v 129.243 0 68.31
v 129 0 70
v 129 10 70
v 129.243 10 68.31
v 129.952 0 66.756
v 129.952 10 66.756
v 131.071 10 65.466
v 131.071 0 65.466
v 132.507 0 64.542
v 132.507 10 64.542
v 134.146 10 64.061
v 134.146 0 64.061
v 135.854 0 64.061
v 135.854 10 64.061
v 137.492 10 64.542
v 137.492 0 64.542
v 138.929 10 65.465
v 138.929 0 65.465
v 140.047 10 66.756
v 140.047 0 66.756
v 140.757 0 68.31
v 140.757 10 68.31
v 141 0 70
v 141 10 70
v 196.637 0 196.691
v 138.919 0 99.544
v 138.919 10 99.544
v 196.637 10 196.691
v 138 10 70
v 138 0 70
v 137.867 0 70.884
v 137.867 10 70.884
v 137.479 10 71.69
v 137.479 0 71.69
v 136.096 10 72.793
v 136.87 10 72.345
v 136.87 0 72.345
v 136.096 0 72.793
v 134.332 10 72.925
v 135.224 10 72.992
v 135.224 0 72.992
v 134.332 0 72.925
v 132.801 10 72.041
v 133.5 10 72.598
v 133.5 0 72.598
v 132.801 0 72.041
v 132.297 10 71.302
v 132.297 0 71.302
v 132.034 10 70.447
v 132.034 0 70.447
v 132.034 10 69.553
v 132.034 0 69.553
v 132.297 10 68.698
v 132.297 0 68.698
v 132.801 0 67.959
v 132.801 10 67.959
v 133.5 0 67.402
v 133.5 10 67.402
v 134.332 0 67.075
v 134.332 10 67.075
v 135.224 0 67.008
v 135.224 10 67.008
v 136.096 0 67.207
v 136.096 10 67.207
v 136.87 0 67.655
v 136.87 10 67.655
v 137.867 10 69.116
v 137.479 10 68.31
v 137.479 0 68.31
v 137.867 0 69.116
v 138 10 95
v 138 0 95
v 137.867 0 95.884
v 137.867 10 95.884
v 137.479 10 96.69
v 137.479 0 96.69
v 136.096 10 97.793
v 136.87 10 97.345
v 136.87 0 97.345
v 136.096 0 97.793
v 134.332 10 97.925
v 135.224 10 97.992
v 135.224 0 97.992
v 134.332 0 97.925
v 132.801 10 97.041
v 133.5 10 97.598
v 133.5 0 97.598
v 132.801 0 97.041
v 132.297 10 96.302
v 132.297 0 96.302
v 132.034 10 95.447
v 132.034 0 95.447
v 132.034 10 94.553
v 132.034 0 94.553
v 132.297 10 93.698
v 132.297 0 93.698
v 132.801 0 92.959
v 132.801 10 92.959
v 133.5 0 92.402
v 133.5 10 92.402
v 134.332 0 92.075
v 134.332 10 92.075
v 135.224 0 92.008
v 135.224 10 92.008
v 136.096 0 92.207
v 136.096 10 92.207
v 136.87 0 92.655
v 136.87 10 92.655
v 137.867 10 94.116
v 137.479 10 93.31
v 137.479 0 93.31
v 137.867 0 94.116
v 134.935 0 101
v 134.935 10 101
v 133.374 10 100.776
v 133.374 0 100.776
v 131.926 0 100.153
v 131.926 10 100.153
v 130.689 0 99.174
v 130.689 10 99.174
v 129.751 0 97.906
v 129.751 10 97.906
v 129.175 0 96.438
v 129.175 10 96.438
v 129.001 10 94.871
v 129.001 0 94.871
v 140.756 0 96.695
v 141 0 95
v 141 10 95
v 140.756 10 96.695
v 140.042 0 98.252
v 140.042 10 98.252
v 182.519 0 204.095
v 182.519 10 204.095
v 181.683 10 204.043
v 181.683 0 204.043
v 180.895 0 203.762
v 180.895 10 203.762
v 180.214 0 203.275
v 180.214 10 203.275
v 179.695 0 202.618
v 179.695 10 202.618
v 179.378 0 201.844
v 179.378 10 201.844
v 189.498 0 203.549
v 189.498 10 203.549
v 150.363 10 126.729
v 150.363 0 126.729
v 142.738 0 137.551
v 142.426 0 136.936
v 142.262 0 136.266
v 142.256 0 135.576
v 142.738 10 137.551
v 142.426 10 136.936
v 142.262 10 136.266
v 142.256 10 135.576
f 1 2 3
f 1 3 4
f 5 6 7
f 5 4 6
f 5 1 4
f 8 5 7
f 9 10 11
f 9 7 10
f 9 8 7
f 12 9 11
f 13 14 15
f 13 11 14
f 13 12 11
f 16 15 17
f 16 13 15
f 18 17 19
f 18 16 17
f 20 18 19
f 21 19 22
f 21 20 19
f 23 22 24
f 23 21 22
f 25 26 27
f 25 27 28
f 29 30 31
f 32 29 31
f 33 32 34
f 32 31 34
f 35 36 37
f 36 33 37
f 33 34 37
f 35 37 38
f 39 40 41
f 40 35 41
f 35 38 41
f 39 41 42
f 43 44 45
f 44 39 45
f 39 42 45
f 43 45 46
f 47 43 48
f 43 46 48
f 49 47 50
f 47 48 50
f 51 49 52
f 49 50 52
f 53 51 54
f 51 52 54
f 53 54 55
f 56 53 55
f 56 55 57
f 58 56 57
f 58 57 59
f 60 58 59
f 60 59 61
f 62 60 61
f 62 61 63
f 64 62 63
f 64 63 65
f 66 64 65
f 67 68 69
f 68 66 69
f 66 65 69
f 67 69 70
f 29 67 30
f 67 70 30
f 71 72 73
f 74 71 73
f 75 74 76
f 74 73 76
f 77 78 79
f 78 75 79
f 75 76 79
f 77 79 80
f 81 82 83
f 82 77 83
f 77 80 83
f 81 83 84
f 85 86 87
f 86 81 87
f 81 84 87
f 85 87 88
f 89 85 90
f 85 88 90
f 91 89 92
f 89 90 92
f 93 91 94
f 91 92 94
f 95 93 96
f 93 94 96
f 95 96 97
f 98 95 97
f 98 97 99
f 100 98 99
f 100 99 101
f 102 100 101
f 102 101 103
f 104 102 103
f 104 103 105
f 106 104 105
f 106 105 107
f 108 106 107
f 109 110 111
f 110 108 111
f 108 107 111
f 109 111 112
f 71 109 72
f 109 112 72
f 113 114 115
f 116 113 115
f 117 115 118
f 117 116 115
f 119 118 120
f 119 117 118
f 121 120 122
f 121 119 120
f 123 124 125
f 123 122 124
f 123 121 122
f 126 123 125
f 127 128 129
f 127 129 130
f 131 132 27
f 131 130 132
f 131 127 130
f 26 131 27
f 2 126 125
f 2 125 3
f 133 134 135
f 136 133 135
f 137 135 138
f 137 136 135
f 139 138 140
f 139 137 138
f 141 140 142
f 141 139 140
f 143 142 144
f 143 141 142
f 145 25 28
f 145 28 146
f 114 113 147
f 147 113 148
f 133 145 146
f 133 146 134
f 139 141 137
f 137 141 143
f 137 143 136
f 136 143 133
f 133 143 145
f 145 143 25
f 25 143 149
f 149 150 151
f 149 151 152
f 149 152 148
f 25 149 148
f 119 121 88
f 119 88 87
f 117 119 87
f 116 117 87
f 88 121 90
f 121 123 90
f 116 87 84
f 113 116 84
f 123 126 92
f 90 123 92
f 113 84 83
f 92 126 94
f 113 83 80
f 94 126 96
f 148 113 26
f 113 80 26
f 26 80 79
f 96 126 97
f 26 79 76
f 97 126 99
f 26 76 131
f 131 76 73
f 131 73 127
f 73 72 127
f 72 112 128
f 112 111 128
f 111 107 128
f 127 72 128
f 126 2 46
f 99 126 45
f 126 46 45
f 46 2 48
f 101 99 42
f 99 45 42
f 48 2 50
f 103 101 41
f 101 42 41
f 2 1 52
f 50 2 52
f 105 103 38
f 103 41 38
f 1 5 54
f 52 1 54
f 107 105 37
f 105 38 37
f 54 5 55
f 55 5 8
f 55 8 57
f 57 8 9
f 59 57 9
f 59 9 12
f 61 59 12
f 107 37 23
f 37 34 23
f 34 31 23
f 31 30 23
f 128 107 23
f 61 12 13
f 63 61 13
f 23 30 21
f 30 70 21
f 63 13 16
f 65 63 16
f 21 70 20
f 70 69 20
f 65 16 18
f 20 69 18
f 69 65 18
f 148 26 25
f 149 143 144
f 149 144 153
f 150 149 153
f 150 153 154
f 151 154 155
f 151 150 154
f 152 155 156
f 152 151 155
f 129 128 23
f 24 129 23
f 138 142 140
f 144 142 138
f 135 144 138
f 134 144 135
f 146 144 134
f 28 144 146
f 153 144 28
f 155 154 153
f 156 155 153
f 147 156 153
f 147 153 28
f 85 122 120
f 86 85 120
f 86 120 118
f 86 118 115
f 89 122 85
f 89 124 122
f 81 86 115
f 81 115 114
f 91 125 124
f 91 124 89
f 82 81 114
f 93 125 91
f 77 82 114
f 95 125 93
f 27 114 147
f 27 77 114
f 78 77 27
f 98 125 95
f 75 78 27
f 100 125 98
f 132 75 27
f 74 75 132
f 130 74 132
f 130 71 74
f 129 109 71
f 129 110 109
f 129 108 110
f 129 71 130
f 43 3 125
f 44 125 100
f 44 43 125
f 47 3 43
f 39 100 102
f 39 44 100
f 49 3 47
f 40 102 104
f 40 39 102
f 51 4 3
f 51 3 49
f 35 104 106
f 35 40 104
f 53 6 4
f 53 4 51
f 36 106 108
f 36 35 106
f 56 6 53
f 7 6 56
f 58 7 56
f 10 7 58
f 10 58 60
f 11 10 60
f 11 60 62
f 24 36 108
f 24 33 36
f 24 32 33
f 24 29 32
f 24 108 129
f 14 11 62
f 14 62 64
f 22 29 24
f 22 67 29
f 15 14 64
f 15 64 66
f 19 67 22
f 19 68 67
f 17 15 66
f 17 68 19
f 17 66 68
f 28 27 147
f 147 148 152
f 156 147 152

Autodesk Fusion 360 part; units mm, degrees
sketch "Sketch1" plane through (0, 0, 0) normal (0, 1, 0) x (1, 0, 0)
  circle A0 centre (0.0008, 24.9355) radius 3
  line L0 (2.5556, 32.9383) -> (-2.4444, 32.9383)
  line L1 (2.5556, 20.6375) -> (2.5556, -15.7025)
  line L2 (8, 25) -> (8, -20)
  circle A1 centre (0, -20) radius 3
  line L3 (-2.6799, 20.7149) -> (-2.6799, -15.7789)
  arc A2 (2.5556, 20.6375) -> (-2.6799, 20.7149) centre (0.0008, 24.9355) ccw
  arc A3 (-2.6799, -15.7789) -> (2.5556, -15.7025) centre (0, -20) ccw
  dimension "d1" = 6
  dimension "d2" = 10
  dimension "d4" = 5
  dimension "d5" = 36.34
  dimension "d6" = 45
  dimension "d7" = 6
sketch "Sketch2" plane through (0, 0, 0) normal (0, 1, 0) x (1, 0, 0)
  circle A0 centre (160, 0) radius 3
  line L0 (165.3043, -12.1067) -> (165.3043, 17.8933)
  line L1 (165.3043, -12.1067) -> (144.0787, -27.9224)
  line L2 (144.0787, -27.9224) -> (124.0787, -27.9224)
  line L3 (124.0787, -27.9224) -> (105.4535, -9.1138)
  line L4 (105.4535, -9.1138) -> (98.3535, -9.1138)
  line L5 (98.3535, -9.1138) -> (98.3535, 10.8862)
  line L6 (98.3535, 10.8862) -> (112.5535, 10.8862)
  line L7 (112.5535, 10.8862) -> (128, 34)
  line L8 (128, 34) -> (153, 34)
  line L9 (153, 34) -> (165.3043, 17.8933)
  circle A1 centre (144.0787, -15.0238) radius 3
  circle A2 centre (124.0787, -15.0238) radius 3
  line L10 (112.4283, -2.9974) -> (127.553, -3)
  line L11 (127.2855, 2.988) -> (112.556, 3)
  arc A3 (127.553, -3) -> (127.2855, 2.988) centre (127.5535, 0) ccw
  arc A4 (112.556, 3) -> (112.6778, -2.9974) centre (112.5535, 0) ccw
  circle A5 centre (128, 28) radius 2
  circle A6 centre (153, 28) radius 2
  dimension "d10" = 6
  dimension "d11" = 30
  dimension "d12" = 26.47
  dimension "d13" = 20
  dimension "d14" = 26.47
  dimension "d15" = 7.1
  dimension "d16" = 20
  dimension "d17" = 14.2
  dimension "d18" = 27.8
  dimension "d19" = 25
  dimension "d21" = 6
  dimension "d22" = 6
  dimension "d23" = 6
  dimension "d24" = 15
  dimension "d25" = 6
  dimension "d26" = 4
  dimension "d27" = 4
sketch "Sketch3" plane through (0, 0, 0) normal (0, 1, 0) x (1, 0, 0)
sketch "Sketch4" plane through (0, 0, 0) normal (0, 1, 0) x (1, 0, 0)
sketch "Sketch5" plane through (0, 0, 0) normal (0, 1, 0) x (1, 0, 0)
  circle A0 centre (0, -75) radius 3
  circle A1 centre (-0.0243, -126.973) radius 3
  line L0 (-20, -70) -> (-20, -141.97)
  line L1 (-5, -75) -> (-5, -112.8223)
  line L2 (5, -75) -> (5, -112.8395)
  arc A2 (5, -75) -> (-5, -75) centre (0, -75) ccw
  line L3 (-0.05, -141.973) -> (-0.05, -143.513)
  line L4 (-0.05, -143.513) -> (-0.4621, -143.739)
  line L5 (-0.4621, -143.739) -> (-1.4621, -143.739)
  line L6 (-1.4621, -143.739) -> (-1.9628, -143.2357)
  line L7 (-1.9628, -143.2357) -> (-1.9628, -141.8472)
  line L8 (-0.05, -145.0973) -> (-0.05, -123.9731)
  line L9 (-8.7204, -112.6318) -> (-7.8791, -112.0912)
  line L10 (-8.9448, -113.0448) -> (-8.7204, -112.6318)
  line L11 (-8.1122, -114.3403) -> (-8.9448, -113.0448)
  line L12 (-7.1857, -112.2439) -> (-6.4351, -113.412)
  line L13 (-7.8791, -112.0912) -> (-7.1857, -112.2439)
  line L14 (-12.4085, -115.6627) -> (-11.7536, -114.907)
  line L15 (-12.5075, -116.1222) -> (-12.4085, -115.6627)
  line L16 (-11.3436, -117.1306) -> (-12.5075, -116.1222)
  line L17 (-11.0453, -114.8581) -> (-9.996, -115.7674)
  line L18 (-11.7536, -114.907) -> (-11.0453, -114.8581)
  line L19 (-15.0933, -119.6099) -> (-14.6779, -118.7003)
  line L20 (-15.0589, -120.0786) -> (-15.0933, -119.6099)
  line L21 (-13.658, -120.7184) -> (-15.0589, -120.0786)
  line L22 (-14.012, -118.4539) -> (-12.749, -119.0307)
  line L23 (-14.6779, -118.7003) -> (-14.012, -118.4539)
  line L24 (-16.5573, -124.1536) -> (-16.415, -123.1638)
  line L25 (-16.3922, -124.5936) -> (-16.5573, -124.1536)
  line L26 (-14.8679, -124.8128) -> (-16.3922, -124.5936)
  line L27 (-15.8455, -122.7398) -> (-14.4712, -122.9374)
  line L28 (-16.415, -123.1638) -> (-15.8455, -122.7398)
  line L29 (-16.682, -128.9257) -> (-16.8243, -127.9359)
  line L30 (-16.3995, -129.3014) -> (-16.682, -128.9257)
  line L31 (-14.8752, -129.0822) -> (-16.3995, -129.3014)
  line L32 (-16.3973, -127.3686) -> (-15.023, -127.171)
  line L33 (-16.8243, -127.9359) -> (-16.3973, -127.3686)
  line L34 (-15.4571, -133.5396) -> (-15.8725, -132.63)
  line L35 (-15.0802, -133.8205) -> (-15.4571, -133.5396)
  line L36 (-13.6794, -133.1808) -> (-15.0802, -133.8205)
  line L37 (-15.6226, -131.9654) -> (-14.3596, -131.3886)
  line L38 (-15.8725, -132.63) -> (-15.6226, -131.9654)
  line L39 (-12.9819, -137.6215) -> (-13.6367, -136.8658)
  line L40 (-12.5412, -137.7849) -> (-12.9819, -137.6215)
  line L41 (-11.3773, -136.7764) -> (-12.5412, -137.7849)
  line L42 (-13.5843, -136.1577) -> (-12.5349, -135.2485)
  line L43 (-13.6367, -136.8658) -> (-13.5843, -136.1577)
  line L44 (-9.457, -140.8408) -> (-10.2982, -140.3002)
  line L45 (-8.9881, -140.8734) -> (-9.457, -140.8408)
  line L46 (-8.1555, -139.5779) -> (-8.9881, -140.8734)
  line L47 (-10.4473, -139.606) -> (-9.6967, -138.4379)
  line L48 (-10.2982, -140.3002) -> (-10.4473, -139.606)
  line L49 (-5.1679, -142.9365) -> (-6.1274, -142.6548)
  line L50 (-4.7088, -142.8357) -> (-5.1679, -142.9365)
  line L51 (-4.2749, -141.3581) -> (-4.7088, -142.8357)
  line L52 (-6.466, -142.0308) -> (-6.0748, -140.6985)
  line L53 (-6.1274, -142.6548) -> (-6.466, -142.0308)
  arc A3 (-5, -112.8223) -> (-6.4351, -113.412) centre (-0.0243, -126.973) ccw
  arc A4 (-8.1122, -114.3403) -> (-9.996, -115.7674) centre (-0.0243, -126.973) ccw
  arc A5 (-11.3436, -117.1306) -> (-12.749, -119.0307) centre (-0.0243, -126.973) ccw
  arc A6 (-13.658, -120.7184) -> (-14.4712, -122.9374) centre (-0.0243, -126.973) ccw
  arc A7 (-14.8679, -124.8128) -> (-15.023, -127.171) centre (-0.0243, -126.973) ccw
  arc A8 (-14.8752, -129.0822) -> (-14.3596, -131.3886) centre (-0.0243, -126.973) ccw
  arc A9 (-13.6794, -133.1808) -> (-12.5349, -135.2485) centre (-0.0243, -126.973) ccw
  arc A10 (-11.3773, -136.7764) -> (-9.6967, -138.4379) centre (-0.0243, -126.973) ccw
  arc A11 (-8.1555, -139.5779) -> (-6.0748, -140.6985) centre (-0.0243, -126.973) ccw
  arc A12 (-4.2749, -141.3581) -> (-1.9628, -141.8472) centre (-0.0243, -126.973) ccw
  arc A13 (-0.05, -141.973) -> (5, -112.8395) centre (-0.0243, -126.973) ccw
  dimension "d30" = 6
  dimension "d31" = 10
  dimension "d32" = 6
  dimension "d33" = 30
  dimension "d34" = 71.97
  dimension "d35" = 1.54
  dimension "d36" = 0.47
  dimension "d37" = 1
  dimension "d38" = 0.71
  dimension "d40" = 360
sketch "Sketch6" plane through (0, 0, 0) normal (0, 1, 0) x (1, 0, 0)
  circle A0 centre (135, -70) radius 3
  circle A1 centre (135, -95) radius 3
  line L0 (129.0014, -94.8707) -> (129, -70.0003)
  line L1 (141, -95) -> (141, -70)
  arc A2 (141, -70) -> (129, -70.0003) centre (135, -70) ccw
  line L2 (134.9353, -100.9997) -> (150.363, -126.7288)
  line L3 (138.9186, -99.5437) -> (196.6373, -196.6907)
  arc A3 (129.0014, -94.8707) -> (134.9353, -100.9997) centre (135, -95) ccw
  arc A4 (138.9186, -99.5437) -> (141, -95) centre (135, -95) ccw
  line L4 (196.6373, -196.6907) -> (189.4976, -203.5489)
  line L5 (189.4976, -203.5489) -> (182.5189, -204.0946)
  line L6 (179.3777, -201.8435) -> (142.738, -137.5509)
  arc A5 (179.3777, -201.8435) -> (182.5189, -204.0946) centre (182.2851, -201.1037) ccw
  arc A6 (142.2555, -135.5758) -> (142.738, -137.5509) centre (145.2387, -135.8936) ccw
  line L7 (150.363, -126.7288) -> (142.2555, -135.5758)
  dimension "d43" = 6
  dimension "d44" = 12
  dimension "d45" = 25
  dimension "d46" = 6
  dimension "d47" = 12
  dimension "d48" = 30
  dimension "d50" = 113
  dimension "d52" = 9.9
  dimension "d53" = 7
  dimension "d62" = 6
  dimension "d63" = 74
  dimension "d64" = 6
  dimension "d69" = 12
extrude "Extrude5" add sketch "Sketch6" along normal blind 10
